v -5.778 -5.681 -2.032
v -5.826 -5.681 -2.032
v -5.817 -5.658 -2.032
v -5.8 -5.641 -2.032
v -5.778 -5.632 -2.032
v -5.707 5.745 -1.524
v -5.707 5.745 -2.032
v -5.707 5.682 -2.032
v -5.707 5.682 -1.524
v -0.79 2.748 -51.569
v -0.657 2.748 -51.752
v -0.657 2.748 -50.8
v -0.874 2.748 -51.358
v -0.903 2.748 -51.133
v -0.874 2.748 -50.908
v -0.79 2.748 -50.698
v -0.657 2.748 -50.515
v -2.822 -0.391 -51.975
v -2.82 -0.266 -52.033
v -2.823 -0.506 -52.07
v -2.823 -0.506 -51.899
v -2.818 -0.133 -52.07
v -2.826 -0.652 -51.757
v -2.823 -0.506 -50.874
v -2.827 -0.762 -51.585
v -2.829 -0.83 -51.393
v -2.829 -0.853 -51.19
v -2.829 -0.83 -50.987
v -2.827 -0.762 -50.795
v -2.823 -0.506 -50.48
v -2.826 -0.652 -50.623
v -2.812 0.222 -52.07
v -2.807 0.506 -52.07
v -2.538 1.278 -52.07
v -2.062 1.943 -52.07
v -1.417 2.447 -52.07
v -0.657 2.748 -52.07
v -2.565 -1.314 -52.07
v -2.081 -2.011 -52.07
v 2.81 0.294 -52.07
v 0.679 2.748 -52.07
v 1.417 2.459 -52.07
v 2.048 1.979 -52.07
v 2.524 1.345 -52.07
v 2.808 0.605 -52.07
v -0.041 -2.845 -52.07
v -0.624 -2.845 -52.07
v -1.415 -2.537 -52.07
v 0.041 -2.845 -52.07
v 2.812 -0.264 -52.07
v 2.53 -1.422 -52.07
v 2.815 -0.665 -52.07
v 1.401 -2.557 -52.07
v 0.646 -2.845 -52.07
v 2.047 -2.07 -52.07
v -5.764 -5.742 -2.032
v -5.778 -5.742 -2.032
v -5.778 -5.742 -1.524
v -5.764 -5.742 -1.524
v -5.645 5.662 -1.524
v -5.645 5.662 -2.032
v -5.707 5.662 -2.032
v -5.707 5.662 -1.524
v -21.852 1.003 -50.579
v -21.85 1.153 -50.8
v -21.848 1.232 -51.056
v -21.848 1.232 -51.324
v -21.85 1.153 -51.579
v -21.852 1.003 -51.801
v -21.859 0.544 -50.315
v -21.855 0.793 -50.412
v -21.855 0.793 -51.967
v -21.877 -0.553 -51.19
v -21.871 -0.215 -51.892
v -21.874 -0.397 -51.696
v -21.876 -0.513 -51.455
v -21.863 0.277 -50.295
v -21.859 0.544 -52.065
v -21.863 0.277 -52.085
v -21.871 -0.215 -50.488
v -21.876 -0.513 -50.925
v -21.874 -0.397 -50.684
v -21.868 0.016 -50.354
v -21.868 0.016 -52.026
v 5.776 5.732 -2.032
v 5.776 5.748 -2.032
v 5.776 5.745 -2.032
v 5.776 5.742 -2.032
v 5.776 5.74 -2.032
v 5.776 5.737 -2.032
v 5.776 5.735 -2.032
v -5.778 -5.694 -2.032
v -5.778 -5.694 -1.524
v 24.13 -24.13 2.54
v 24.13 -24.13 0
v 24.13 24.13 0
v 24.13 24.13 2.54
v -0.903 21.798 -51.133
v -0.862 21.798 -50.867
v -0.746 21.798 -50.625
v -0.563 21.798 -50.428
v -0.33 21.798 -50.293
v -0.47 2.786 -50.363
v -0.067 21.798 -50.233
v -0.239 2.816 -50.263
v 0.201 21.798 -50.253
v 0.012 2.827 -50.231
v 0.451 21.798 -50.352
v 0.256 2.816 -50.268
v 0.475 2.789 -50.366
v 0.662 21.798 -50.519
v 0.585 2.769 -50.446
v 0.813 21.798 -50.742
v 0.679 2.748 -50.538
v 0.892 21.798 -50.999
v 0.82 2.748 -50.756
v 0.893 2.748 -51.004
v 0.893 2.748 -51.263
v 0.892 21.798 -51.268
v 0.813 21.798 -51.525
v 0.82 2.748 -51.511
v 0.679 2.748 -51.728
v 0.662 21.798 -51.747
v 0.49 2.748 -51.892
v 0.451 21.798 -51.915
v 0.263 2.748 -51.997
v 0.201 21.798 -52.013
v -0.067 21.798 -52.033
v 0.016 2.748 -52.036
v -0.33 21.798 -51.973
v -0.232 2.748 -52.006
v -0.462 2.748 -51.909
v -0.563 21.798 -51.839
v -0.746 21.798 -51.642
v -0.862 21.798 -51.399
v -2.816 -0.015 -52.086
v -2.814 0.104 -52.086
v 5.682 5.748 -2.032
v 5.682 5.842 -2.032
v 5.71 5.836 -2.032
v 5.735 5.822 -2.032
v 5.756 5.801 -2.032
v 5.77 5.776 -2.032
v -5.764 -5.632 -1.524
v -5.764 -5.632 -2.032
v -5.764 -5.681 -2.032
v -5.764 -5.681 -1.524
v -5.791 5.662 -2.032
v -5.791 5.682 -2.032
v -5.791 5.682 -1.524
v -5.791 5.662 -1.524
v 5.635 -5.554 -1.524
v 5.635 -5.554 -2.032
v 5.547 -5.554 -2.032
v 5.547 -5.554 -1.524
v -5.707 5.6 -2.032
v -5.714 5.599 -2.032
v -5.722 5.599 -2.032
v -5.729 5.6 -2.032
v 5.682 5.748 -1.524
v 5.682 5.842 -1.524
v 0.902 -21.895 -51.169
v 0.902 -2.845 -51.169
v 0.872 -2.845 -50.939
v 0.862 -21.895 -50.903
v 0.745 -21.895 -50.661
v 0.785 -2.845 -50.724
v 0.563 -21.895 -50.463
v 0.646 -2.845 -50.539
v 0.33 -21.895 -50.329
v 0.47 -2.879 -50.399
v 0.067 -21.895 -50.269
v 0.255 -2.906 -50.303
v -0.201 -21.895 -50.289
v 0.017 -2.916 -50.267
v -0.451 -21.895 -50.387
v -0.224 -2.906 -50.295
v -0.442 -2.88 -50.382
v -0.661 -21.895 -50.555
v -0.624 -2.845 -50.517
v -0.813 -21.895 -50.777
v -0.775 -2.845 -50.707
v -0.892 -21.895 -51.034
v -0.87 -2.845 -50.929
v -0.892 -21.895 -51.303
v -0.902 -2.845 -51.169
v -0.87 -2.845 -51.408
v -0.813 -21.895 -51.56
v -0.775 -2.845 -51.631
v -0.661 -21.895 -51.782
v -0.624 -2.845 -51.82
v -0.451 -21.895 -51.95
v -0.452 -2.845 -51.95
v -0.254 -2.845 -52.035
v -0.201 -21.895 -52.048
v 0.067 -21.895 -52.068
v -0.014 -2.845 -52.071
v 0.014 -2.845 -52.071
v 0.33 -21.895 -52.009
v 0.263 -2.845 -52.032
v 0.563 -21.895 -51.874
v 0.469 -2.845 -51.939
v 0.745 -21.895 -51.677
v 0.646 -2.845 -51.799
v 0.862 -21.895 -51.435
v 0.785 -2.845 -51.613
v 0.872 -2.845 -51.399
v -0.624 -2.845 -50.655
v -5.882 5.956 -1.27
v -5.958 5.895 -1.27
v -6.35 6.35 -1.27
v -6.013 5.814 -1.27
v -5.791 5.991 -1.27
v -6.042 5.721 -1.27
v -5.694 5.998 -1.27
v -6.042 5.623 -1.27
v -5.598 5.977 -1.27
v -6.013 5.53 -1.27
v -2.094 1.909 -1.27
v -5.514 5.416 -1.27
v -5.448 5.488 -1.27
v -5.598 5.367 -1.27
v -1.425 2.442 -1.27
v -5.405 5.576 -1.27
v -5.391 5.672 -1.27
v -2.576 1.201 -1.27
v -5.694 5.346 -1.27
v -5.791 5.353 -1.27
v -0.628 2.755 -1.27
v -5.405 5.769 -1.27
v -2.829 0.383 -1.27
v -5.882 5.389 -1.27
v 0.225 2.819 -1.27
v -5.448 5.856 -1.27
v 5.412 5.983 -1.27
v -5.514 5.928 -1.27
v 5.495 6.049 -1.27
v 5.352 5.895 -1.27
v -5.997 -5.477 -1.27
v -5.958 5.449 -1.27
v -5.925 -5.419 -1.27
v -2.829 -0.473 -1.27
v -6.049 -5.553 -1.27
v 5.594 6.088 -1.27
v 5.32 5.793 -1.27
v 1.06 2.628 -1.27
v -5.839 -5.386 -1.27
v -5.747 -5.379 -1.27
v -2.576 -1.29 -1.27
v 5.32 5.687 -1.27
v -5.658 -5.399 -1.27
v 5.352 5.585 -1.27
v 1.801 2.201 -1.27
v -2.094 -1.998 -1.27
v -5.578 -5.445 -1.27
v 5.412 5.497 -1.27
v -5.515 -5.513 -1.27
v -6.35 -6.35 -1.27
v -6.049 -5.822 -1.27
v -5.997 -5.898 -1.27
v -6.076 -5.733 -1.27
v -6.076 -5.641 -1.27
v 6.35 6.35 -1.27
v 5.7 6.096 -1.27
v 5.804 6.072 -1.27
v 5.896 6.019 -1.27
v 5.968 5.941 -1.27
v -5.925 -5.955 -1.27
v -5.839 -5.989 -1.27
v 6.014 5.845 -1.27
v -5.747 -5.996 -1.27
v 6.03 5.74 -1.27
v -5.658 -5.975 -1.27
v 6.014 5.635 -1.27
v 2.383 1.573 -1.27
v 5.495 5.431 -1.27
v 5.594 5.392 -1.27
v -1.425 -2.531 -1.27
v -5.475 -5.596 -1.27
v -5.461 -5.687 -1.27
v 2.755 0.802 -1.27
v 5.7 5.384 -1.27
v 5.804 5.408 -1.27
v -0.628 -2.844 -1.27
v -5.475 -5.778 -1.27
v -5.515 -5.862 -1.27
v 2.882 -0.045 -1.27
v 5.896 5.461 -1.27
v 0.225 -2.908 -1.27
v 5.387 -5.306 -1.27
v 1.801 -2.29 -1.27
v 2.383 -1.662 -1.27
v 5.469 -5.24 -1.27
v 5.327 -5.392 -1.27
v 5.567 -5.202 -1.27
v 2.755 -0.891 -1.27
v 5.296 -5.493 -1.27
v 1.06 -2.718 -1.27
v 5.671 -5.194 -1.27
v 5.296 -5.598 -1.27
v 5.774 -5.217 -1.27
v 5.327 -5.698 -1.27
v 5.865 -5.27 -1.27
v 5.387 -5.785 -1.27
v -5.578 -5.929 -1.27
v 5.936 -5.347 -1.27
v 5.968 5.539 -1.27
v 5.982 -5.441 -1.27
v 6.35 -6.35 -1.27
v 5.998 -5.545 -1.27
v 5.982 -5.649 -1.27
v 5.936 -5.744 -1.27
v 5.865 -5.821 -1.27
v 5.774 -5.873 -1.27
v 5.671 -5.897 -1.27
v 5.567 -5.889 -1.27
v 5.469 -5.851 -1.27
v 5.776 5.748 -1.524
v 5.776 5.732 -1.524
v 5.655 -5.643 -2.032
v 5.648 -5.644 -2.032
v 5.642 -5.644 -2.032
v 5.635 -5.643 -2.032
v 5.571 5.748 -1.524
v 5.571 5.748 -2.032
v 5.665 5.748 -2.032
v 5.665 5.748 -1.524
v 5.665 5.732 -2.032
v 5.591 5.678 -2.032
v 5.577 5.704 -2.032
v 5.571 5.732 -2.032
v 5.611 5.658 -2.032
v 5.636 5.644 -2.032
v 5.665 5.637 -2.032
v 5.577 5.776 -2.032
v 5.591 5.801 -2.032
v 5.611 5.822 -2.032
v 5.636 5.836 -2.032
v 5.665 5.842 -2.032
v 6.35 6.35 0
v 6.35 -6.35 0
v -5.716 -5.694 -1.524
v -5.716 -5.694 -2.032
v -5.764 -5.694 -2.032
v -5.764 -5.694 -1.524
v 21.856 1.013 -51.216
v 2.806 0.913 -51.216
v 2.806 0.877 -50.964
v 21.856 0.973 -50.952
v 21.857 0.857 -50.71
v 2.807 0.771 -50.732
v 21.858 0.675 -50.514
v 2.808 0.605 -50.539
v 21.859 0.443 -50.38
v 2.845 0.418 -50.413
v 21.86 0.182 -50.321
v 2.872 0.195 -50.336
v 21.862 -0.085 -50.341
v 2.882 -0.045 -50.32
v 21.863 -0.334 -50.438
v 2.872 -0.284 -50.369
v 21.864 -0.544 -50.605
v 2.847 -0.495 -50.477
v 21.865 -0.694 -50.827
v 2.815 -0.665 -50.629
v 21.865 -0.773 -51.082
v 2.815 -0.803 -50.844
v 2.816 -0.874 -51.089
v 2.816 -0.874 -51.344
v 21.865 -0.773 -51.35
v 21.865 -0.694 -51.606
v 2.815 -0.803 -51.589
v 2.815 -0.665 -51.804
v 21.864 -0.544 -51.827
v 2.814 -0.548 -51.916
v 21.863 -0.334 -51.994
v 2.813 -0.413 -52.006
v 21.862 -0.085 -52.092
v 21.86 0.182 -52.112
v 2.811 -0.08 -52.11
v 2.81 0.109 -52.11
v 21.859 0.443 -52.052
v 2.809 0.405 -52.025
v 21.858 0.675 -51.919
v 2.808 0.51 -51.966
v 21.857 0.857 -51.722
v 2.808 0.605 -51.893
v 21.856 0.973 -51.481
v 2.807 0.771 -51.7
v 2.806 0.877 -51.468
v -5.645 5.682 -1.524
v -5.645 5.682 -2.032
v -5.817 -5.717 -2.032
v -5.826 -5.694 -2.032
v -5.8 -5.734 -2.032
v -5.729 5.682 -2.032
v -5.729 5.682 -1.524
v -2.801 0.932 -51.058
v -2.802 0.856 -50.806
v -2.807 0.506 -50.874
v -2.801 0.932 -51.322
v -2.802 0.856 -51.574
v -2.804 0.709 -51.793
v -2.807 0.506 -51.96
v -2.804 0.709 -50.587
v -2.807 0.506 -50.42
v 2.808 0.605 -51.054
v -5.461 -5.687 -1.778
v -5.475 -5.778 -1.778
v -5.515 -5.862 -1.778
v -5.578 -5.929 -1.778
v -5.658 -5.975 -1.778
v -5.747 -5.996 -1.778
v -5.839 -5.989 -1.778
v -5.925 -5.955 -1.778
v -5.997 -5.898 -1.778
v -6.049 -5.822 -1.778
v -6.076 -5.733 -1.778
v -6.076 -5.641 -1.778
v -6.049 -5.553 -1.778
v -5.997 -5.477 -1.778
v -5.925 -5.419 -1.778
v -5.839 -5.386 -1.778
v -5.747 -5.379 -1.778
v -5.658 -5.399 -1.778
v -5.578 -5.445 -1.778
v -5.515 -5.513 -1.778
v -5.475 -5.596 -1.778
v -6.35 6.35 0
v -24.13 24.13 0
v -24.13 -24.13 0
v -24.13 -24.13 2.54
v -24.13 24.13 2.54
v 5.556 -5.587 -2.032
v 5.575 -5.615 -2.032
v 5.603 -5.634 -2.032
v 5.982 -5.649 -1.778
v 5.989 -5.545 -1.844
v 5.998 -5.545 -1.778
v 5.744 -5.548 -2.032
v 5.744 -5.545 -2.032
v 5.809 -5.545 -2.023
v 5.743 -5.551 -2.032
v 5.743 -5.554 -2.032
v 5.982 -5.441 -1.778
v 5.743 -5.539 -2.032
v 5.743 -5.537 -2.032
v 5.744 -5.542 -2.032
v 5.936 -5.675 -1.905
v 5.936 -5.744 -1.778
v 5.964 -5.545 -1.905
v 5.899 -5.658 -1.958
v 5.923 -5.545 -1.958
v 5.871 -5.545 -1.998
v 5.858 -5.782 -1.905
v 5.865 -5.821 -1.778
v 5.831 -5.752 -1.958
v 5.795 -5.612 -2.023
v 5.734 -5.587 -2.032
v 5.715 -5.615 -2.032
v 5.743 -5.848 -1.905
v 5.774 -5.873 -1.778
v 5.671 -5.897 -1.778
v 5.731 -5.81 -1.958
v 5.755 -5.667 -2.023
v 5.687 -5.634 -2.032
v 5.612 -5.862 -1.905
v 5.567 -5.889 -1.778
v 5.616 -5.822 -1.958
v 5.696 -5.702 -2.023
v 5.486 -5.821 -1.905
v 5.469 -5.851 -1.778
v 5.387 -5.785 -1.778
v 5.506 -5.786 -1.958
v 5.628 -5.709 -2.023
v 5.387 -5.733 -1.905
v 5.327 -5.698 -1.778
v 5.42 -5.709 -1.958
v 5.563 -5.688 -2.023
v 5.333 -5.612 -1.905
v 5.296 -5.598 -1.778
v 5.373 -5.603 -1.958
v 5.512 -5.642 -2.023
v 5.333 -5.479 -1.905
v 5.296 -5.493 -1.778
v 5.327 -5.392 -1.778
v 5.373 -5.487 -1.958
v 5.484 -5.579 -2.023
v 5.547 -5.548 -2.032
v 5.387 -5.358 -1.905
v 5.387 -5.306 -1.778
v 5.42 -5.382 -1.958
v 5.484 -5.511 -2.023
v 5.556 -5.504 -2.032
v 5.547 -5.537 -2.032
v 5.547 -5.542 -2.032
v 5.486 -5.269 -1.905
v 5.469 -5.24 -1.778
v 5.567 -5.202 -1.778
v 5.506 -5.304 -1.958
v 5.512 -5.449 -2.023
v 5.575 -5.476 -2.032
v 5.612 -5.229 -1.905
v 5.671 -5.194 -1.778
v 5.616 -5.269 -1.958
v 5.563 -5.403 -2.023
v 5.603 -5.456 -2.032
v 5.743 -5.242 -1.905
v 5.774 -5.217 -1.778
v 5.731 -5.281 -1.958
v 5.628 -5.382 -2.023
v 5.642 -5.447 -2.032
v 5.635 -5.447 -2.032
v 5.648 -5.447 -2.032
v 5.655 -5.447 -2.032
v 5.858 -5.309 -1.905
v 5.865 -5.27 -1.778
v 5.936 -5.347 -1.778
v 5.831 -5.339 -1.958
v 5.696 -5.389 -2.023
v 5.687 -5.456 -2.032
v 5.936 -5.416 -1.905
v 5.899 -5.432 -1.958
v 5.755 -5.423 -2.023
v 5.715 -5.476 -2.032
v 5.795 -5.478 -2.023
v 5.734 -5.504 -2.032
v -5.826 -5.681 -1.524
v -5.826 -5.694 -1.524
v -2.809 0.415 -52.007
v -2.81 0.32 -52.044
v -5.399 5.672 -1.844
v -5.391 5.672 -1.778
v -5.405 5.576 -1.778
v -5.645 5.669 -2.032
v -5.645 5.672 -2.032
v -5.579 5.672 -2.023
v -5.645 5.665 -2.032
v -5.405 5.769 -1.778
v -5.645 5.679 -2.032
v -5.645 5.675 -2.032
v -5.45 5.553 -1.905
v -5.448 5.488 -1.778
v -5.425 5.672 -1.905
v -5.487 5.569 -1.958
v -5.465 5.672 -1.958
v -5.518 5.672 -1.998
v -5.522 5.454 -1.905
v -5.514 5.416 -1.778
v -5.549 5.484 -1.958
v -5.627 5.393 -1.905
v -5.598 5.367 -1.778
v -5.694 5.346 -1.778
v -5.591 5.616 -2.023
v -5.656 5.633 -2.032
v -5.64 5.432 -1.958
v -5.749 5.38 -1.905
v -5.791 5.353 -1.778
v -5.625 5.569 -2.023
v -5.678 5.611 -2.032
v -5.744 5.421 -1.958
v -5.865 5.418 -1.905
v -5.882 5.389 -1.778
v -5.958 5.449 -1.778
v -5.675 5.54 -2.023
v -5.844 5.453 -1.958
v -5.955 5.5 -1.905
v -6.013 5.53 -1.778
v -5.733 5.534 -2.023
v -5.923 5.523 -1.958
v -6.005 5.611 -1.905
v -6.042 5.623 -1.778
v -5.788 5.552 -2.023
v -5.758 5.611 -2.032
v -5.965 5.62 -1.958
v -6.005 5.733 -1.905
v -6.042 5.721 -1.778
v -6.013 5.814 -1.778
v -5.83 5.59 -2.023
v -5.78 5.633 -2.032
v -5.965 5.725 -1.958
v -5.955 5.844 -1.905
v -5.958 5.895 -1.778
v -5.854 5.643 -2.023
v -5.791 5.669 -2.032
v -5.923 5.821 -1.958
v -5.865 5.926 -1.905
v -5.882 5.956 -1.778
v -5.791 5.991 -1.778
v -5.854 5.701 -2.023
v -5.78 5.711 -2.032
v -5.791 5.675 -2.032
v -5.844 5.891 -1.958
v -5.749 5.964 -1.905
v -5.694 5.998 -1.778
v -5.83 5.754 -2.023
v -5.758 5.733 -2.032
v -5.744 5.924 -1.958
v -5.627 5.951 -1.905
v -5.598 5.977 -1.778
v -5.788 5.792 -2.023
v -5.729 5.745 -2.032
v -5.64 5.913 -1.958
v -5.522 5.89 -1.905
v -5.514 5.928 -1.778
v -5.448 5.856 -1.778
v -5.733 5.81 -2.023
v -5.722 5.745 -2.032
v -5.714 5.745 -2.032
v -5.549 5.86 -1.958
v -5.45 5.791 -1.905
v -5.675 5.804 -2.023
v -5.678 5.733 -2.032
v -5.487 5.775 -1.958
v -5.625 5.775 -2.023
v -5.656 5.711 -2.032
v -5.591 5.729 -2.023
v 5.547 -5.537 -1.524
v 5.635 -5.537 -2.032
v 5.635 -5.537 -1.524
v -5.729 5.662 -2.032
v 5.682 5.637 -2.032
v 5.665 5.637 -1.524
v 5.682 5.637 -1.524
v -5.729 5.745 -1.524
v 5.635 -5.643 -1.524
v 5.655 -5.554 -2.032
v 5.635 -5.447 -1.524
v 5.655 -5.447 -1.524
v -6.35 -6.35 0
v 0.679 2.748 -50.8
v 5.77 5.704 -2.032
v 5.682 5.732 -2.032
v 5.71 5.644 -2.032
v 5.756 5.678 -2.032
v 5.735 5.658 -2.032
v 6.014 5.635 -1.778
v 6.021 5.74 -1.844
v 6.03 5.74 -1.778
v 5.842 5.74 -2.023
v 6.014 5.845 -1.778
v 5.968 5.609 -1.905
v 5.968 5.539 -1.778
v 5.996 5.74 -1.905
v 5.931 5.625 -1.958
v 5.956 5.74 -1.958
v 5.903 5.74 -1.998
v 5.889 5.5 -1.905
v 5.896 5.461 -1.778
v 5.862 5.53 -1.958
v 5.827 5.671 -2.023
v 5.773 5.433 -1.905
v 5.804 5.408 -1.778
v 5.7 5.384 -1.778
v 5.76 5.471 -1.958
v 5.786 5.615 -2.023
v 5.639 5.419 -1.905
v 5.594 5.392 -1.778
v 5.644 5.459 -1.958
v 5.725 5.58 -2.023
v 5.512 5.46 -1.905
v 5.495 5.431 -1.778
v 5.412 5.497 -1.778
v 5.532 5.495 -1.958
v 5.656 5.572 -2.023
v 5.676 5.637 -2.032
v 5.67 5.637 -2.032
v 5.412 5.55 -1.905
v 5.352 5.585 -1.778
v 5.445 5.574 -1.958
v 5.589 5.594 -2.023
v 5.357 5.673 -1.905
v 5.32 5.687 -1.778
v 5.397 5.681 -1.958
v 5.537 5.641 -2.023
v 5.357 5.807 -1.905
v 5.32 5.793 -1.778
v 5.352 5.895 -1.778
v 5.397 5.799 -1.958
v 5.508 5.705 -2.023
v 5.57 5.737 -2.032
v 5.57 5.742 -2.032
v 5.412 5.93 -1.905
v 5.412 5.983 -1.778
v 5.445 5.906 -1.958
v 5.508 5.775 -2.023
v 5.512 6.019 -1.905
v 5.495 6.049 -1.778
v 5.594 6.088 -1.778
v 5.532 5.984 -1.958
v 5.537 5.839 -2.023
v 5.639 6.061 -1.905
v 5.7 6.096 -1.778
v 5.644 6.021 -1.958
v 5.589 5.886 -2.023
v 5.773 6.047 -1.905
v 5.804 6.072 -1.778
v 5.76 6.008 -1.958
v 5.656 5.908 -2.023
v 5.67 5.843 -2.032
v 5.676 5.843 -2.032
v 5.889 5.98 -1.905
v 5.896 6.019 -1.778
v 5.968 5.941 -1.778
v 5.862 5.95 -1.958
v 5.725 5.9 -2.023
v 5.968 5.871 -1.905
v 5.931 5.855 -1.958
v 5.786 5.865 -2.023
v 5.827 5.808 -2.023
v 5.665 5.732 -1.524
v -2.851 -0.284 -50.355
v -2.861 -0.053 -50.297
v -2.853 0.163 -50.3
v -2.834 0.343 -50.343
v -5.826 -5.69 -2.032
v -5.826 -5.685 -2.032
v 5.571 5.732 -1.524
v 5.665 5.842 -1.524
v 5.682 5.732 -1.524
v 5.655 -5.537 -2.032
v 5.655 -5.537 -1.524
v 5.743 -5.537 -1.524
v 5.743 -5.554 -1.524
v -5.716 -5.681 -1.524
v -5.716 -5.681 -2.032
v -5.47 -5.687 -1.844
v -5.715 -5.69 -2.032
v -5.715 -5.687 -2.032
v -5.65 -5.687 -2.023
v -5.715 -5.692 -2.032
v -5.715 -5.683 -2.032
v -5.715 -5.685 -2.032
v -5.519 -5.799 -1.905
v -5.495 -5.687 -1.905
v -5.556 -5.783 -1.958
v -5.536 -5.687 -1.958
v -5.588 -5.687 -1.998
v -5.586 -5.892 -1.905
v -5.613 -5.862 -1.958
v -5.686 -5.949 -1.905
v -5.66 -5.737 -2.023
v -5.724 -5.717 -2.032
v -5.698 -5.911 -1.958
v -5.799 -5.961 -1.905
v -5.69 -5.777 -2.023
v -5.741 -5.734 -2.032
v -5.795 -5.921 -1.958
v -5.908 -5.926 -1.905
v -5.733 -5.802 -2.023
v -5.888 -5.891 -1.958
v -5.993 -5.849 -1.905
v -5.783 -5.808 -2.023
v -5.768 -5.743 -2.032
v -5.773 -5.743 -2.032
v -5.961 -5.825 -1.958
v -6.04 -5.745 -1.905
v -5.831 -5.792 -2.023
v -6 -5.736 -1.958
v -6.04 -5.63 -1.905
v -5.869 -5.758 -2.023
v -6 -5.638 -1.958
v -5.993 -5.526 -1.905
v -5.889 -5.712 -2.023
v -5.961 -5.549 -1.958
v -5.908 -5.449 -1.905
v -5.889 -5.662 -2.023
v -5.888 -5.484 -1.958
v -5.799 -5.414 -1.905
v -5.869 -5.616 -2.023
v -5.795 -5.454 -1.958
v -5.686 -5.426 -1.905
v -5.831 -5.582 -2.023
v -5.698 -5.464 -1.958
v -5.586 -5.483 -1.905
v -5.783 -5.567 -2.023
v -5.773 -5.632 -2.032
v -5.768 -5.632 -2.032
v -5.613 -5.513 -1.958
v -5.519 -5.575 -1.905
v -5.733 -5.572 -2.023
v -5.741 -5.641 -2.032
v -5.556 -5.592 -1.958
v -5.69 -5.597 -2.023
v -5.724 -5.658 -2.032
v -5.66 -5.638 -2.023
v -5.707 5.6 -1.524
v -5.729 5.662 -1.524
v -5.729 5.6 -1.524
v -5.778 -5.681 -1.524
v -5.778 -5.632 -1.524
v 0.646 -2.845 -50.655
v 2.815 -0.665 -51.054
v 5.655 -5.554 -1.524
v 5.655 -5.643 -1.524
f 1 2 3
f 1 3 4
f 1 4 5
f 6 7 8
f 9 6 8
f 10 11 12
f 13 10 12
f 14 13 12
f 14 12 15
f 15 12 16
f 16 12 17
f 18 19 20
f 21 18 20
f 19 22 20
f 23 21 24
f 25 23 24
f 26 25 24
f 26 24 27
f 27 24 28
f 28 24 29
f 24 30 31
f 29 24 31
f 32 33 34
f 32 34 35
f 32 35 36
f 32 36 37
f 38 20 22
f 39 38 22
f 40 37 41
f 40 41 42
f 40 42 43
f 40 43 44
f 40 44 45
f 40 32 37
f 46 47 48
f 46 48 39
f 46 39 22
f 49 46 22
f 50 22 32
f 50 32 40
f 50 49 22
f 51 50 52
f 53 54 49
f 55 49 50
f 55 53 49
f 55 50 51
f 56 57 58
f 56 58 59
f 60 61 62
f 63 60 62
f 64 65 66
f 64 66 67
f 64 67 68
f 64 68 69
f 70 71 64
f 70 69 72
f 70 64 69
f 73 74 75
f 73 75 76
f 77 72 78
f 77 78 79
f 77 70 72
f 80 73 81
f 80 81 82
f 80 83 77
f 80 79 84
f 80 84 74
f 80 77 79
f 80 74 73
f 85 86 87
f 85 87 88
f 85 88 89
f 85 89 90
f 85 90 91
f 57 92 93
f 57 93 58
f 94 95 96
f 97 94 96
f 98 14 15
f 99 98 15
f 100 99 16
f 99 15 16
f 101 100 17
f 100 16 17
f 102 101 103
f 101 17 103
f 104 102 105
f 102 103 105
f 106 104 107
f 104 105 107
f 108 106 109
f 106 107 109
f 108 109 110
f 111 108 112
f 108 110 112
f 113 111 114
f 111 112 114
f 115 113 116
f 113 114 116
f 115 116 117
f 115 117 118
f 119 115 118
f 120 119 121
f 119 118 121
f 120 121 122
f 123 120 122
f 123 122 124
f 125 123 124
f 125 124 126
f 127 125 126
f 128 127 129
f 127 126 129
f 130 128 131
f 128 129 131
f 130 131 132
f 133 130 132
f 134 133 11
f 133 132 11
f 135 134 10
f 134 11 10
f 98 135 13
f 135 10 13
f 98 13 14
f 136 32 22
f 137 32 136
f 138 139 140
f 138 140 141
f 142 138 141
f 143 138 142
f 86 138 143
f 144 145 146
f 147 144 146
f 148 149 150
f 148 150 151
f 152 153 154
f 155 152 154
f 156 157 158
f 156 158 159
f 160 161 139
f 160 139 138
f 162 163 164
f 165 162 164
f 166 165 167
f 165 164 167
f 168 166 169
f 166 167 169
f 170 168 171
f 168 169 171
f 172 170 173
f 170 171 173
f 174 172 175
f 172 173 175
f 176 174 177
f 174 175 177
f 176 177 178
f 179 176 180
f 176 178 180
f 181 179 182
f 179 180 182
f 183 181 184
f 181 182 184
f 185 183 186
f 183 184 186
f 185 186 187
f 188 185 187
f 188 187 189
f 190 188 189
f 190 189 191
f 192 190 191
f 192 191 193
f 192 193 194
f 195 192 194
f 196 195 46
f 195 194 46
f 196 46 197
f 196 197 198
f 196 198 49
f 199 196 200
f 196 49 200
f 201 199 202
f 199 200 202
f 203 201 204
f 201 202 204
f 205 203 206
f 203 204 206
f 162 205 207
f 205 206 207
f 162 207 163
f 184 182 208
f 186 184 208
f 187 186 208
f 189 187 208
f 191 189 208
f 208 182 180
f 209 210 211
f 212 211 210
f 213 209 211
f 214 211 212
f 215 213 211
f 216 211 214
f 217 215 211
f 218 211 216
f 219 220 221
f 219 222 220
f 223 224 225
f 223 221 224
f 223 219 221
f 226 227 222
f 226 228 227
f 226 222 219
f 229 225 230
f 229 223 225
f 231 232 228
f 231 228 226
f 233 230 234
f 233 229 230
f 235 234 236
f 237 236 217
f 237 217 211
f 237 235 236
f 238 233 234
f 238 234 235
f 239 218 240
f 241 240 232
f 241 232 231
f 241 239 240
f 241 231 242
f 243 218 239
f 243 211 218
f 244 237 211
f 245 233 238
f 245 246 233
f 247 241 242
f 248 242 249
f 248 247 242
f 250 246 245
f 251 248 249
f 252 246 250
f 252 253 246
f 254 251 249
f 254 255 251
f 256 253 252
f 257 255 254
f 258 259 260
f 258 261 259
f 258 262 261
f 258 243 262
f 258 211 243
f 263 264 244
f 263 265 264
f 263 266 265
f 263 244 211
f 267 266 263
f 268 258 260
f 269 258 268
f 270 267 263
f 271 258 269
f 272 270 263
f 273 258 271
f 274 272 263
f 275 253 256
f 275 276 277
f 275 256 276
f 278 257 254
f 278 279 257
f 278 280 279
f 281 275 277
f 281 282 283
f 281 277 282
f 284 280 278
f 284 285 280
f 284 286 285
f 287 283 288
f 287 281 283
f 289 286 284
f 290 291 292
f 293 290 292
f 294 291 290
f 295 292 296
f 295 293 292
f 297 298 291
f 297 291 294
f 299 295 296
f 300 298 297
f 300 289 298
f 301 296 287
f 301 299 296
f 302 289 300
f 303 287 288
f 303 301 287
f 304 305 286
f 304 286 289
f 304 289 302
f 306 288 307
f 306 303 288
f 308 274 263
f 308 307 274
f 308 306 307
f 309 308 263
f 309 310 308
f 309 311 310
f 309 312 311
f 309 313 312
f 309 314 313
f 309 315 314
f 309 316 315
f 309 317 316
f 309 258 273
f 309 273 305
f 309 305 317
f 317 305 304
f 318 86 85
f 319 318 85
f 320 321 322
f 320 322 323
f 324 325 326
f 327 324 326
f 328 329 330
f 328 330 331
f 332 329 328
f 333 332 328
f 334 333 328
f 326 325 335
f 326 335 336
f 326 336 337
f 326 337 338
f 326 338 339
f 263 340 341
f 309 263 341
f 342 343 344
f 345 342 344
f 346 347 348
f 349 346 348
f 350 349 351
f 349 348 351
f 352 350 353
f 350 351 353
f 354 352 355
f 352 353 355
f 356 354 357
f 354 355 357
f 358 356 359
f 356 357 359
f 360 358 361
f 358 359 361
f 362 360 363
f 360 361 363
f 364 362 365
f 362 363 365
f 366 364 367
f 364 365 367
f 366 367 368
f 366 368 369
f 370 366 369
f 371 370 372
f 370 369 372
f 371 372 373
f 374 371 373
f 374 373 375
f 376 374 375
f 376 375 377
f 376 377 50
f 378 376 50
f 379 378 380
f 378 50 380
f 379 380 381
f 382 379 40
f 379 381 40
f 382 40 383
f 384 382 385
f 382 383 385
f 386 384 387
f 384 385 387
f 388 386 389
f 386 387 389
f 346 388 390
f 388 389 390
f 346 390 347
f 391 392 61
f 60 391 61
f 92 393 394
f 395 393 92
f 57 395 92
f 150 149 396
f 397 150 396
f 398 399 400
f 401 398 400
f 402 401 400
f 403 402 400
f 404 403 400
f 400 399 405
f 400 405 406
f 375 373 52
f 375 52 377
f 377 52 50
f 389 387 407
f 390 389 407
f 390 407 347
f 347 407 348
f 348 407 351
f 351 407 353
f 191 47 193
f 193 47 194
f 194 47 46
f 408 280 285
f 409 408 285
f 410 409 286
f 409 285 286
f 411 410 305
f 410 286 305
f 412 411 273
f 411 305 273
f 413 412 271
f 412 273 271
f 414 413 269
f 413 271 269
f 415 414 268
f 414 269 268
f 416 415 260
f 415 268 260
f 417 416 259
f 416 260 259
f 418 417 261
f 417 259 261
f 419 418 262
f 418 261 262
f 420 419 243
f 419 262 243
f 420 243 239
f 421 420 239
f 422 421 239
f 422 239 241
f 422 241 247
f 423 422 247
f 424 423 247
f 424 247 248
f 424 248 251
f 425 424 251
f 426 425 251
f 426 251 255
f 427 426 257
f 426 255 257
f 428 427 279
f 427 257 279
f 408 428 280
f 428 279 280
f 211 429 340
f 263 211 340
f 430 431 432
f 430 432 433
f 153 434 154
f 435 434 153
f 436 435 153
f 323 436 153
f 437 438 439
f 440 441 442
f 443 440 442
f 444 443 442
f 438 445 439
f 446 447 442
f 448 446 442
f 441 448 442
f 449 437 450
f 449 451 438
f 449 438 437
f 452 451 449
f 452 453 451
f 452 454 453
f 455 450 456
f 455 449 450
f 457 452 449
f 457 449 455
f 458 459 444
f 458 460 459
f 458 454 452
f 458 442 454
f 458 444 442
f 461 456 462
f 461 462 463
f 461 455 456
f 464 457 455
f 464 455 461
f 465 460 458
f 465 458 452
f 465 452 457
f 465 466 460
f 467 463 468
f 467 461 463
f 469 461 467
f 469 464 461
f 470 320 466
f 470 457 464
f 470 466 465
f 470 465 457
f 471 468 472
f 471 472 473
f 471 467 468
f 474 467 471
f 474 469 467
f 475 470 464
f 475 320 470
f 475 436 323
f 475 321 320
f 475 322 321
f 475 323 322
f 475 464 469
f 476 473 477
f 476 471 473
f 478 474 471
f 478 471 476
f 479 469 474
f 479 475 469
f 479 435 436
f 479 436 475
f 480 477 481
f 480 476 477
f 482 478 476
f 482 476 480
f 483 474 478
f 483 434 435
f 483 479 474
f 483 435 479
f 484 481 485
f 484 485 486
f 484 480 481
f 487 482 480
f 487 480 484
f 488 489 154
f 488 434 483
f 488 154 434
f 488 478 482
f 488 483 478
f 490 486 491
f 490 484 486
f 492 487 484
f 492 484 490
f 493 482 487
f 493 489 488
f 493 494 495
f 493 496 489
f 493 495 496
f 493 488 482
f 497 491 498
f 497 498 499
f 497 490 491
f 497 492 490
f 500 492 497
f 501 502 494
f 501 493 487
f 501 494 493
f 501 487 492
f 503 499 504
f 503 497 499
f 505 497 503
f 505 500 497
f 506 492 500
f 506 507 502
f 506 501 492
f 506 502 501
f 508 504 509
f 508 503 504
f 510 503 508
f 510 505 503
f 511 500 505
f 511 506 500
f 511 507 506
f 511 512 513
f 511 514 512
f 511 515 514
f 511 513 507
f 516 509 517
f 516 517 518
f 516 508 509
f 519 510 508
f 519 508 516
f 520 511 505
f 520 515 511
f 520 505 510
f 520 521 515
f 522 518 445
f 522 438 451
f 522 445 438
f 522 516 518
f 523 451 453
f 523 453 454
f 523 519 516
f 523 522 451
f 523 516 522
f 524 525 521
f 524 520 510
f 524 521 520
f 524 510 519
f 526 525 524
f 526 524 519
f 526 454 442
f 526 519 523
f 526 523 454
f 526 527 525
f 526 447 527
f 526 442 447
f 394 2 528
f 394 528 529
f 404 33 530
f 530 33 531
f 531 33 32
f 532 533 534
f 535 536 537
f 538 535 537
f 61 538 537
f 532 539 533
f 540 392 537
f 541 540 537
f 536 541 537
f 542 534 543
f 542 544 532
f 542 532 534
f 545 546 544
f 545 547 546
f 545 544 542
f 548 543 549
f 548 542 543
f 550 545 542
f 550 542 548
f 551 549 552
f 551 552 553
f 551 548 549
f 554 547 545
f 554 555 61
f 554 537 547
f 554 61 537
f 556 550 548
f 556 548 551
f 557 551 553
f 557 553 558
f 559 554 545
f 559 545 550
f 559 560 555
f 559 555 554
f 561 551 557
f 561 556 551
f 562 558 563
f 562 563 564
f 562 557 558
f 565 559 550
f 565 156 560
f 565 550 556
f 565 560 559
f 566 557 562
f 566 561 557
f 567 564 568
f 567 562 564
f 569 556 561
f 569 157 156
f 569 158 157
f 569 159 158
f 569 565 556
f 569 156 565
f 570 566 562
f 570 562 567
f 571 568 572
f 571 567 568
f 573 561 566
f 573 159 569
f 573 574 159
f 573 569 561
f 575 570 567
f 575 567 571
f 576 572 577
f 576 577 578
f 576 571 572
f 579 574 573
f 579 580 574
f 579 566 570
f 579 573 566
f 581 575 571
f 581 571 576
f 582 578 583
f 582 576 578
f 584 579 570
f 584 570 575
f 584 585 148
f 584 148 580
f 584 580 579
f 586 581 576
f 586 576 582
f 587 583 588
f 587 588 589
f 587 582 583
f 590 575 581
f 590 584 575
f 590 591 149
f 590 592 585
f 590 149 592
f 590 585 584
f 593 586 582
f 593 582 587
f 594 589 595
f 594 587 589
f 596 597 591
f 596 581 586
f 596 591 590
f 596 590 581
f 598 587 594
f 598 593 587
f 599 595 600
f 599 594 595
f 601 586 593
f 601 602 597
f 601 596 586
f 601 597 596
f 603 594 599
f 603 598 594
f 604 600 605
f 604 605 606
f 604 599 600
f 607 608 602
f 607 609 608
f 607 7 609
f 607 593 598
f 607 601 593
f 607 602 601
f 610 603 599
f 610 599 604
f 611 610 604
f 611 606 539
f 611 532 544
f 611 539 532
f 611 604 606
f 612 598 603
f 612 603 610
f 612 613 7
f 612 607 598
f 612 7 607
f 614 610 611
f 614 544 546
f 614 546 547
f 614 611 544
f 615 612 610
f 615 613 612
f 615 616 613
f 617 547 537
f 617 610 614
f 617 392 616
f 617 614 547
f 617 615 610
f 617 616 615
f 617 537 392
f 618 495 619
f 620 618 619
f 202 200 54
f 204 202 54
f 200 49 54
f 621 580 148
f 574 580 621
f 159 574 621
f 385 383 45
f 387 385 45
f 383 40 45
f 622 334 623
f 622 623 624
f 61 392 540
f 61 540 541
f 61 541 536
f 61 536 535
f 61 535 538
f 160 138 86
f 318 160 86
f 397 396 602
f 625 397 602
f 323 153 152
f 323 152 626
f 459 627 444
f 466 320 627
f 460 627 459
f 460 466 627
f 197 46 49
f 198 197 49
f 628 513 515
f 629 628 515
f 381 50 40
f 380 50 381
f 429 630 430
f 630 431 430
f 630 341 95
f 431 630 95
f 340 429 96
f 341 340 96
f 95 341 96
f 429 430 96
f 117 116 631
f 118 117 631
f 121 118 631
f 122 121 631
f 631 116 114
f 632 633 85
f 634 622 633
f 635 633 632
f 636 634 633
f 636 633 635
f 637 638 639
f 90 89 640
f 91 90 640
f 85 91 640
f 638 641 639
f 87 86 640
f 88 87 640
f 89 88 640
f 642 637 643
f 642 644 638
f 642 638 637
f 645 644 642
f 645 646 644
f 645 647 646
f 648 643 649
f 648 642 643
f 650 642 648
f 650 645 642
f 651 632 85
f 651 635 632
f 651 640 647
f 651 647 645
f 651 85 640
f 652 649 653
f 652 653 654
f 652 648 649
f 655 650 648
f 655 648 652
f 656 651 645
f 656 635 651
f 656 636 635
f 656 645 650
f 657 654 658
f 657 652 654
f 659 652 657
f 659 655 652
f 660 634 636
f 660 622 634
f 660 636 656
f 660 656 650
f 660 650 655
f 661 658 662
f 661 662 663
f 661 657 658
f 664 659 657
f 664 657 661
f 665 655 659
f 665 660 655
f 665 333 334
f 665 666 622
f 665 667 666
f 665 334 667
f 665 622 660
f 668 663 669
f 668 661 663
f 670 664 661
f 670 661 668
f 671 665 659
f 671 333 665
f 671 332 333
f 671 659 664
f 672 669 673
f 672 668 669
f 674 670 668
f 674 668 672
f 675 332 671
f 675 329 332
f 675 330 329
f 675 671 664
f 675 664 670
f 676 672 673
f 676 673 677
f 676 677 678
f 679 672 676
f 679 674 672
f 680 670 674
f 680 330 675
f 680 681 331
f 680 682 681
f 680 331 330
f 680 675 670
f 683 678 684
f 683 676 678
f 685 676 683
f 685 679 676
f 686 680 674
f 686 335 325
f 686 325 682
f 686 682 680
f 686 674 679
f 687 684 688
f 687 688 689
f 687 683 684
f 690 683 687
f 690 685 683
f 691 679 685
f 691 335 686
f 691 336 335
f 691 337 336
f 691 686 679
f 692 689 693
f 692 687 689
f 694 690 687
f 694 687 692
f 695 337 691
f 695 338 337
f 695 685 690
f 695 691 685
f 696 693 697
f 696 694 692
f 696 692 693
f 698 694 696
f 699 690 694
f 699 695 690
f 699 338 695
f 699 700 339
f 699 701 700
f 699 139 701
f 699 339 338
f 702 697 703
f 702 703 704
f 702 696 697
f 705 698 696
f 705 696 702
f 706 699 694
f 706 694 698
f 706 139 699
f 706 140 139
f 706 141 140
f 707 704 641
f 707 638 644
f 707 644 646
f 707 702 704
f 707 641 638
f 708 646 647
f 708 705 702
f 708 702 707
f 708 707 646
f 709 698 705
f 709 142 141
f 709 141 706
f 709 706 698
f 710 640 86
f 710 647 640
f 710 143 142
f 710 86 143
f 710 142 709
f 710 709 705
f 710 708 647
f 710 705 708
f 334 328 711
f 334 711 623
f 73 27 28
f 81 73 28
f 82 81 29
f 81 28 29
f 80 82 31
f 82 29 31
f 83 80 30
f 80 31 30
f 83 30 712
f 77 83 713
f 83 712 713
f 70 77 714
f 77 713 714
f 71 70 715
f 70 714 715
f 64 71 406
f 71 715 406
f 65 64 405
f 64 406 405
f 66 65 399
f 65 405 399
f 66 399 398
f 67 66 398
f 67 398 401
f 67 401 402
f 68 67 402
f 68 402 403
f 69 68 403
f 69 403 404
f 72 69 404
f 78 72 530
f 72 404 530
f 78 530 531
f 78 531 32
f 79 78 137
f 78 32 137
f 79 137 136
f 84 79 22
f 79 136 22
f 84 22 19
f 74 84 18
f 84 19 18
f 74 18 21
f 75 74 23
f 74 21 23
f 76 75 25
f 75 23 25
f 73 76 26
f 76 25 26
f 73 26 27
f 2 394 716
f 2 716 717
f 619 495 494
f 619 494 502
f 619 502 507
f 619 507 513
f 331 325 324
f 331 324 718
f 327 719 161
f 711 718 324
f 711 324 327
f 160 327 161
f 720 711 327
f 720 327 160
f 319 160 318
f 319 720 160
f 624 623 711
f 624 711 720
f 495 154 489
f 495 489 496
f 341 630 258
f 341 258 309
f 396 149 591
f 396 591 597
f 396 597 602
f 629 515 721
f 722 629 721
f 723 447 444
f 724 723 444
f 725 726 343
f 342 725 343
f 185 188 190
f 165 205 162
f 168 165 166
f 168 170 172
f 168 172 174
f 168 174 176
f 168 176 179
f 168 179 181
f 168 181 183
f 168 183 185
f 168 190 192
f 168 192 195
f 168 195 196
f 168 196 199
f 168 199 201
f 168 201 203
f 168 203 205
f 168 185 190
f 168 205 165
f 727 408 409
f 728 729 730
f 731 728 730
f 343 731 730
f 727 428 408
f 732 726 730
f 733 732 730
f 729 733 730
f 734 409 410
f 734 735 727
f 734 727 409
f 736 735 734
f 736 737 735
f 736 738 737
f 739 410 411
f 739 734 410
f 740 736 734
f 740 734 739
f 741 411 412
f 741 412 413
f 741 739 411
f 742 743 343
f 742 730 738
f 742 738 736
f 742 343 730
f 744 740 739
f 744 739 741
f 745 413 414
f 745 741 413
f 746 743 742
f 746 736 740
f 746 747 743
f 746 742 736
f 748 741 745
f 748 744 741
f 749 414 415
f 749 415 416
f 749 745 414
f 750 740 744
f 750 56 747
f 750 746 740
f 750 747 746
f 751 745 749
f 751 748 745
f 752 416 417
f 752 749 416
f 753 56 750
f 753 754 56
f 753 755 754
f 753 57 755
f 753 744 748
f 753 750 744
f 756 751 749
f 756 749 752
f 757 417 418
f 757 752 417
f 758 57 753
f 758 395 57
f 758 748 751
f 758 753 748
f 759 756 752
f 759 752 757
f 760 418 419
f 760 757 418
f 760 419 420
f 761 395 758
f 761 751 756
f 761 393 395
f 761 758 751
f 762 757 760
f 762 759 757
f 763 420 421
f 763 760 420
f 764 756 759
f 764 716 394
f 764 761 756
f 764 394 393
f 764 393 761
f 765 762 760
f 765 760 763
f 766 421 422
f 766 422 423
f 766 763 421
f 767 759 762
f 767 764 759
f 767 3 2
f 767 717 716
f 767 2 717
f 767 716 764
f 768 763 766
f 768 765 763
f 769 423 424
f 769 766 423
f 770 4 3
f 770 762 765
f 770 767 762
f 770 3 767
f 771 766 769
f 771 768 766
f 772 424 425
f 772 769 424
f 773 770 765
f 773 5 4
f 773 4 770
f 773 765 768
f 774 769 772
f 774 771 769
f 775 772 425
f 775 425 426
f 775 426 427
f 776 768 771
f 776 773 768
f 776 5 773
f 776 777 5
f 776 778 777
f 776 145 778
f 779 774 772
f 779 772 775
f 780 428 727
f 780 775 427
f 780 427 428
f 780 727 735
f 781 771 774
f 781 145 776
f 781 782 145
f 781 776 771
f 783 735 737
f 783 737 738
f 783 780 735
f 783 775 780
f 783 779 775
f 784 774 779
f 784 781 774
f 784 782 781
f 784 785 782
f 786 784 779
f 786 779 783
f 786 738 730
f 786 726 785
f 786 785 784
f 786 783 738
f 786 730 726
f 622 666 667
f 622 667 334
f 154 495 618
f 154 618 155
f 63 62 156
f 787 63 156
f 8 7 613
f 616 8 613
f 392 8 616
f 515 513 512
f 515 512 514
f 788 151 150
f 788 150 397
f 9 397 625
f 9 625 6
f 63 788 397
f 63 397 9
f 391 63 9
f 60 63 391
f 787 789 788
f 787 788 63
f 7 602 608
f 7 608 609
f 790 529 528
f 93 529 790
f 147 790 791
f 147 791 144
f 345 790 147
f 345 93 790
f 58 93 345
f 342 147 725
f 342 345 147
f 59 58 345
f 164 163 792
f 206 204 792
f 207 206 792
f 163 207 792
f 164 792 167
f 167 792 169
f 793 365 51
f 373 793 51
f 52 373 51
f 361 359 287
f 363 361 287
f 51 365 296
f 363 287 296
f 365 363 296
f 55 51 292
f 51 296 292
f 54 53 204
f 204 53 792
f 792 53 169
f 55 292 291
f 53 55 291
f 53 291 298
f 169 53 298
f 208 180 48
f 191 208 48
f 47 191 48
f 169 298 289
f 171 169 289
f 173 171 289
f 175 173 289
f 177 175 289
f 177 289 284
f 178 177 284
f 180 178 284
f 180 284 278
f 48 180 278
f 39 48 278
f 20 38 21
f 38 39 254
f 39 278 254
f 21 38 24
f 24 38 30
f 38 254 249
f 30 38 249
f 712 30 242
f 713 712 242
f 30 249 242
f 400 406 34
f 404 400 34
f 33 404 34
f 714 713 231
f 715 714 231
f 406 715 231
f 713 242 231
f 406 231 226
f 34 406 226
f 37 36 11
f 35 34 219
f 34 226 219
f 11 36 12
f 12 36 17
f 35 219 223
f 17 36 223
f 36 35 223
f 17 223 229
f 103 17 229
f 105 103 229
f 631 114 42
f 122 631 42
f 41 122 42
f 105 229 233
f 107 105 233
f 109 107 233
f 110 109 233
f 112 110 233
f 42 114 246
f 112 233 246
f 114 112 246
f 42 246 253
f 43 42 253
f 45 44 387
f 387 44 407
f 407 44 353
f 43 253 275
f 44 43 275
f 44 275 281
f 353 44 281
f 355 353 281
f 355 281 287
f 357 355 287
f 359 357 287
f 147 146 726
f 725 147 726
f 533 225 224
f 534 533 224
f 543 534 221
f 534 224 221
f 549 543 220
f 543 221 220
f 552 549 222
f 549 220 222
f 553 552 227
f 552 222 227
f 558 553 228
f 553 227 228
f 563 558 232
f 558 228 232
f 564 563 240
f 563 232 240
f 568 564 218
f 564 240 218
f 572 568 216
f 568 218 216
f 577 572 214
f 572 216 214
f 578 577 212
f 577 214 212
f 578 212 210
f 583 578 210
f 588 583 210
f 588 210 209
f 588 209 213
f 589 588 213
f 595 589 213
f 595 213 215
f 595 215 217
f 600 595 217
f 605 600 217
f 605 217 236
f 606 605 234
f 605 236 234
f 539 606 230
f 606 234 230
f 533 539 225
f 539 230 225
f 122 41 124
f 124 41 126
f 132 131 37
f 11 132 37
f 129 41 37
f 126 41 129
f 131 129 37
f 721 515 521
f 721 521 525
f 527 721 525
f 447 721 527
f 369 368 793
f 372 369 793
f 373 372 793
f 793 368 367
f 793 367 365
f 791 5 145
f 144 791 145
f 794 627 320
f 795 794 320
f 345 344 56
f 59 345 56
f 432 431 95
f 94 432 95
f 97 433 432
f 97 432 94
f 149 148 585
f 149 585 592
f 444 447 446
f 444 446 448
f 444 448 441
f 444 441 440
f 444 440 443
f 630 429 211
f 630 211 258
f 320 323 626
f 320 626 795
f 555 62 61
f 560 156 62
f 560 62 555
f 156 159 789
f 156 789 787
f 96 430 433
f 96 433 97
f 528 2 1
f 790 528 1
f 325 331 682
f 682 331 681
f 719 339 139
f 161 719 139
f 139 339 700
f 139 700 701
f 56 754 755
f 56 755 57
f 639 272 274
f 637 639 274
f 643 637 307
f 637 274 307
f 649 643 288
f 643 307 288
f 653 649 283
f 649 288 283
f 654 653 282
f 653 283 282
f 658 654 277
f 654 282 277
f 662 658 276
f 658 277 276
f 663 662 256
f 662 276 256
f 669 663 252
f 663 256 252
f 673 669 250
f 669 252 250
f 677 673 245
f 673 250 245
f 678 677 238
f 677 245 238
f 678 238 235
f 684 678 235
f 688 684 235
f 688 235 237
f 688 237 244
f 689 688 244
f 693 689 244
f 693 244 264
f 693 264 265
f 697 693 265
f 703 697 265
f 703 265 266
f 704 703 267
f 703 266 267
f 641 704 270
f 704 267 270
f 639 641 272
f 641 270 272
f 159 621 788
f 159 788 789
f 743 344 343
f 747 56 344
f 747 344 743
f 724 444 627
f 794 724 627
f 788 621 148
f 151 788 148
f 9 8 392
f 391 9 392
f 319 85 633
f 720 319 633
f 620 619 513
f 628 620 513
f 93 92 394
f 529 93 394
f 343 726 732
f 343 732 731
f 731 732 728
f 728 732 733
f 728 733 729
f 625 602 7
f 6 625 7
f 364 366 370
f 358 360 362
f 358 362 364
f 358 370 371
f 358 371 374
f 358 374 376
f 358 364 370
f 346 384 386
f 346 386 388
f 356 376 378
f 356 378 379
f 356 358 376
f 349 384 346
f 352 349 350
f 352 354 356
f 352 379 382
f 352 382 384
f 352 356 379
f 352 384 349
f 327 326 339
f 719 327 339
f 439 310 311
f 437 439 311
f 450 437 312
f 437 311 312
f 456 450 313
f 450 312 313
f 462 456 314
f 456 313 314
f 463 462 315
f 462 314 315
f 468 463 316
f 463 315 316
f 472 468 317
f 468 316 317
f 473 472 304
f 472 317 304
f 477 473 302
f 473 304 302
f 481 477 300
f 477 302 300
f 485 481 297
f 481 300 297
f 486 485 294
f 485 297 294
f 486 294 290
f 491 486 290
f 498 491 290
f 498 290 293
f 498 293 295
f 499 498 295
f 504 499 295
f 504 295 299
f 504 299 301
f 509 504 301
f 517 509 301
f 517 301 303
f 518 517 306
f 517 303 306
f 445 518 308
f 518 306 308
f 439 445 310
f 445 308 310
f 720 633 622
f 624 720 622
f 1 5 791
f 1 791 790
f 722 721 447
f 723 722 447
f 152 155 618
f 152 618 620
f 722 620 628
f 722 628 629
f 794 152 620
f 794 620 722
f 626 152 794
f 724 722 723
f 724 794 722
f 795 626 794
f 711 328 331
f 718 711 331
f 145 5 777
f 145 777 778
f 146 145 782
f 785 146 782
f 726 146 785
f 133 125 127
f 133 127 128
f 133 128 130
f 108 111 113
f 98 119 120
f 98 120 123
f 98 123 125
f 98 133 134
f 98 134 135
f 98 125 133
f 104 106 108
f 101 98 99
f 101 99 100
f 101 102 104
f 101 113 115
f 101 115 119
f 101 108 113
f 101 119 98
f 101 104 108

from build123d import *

# Parameters (mm, degrees)
F0_W      = 48.26
F0_H      = 48.26
F1_DEPTH  = 2.54
F2_W      = 12.7
F2_H      = 12.7
F3_DEPTH  = 1.27
F4_R      = 2.8715074031
F5_DEPTH  = 50.8
F6_R      = 0.3093193385
F6_R_2    = 0.3272888375
F6_R_3    = 0.3568571673
F6_R_4    = 0.3525339216
F7_DEPTH  = 0.762
F8_R      = 0.254
F12_W     = 0.0615678008
F12_H     = 0.0203329791
F12_W_2   = 0.0220249466
F12_H_2   = 0.0622902502
F11_W     = 0.0480206565
F11_H     = 0.0132349783
F11_W_2   = 0.0138029049
F11_H_2   = 0.0482696602
F10_W     = 0.0884033393
F10_H     = 0.017505979
F10_W_2   = 0.0194820769
F10_H_2   = 0.0892982516
F9_W      = 0.0940955169
F9_H      = 0.0154326007
F9_W_2    = 0.0169436104
F9_H_2    = 0.0947913842
F13_DEPTH = 0.508
F15_DEPTH = 1.41478
F16_R     = 0.9021855569
F17_DEPTH = 19.05
F19_DEPTH = 1.016
F20_R     = 0.8982139902
F21_DEPTH = 19.05
F23_DEPTH = 1.27
F24_R     = 0.9025250594
F25_DEPTH = 19.05
F27_DEPTH = 1.19634
F28_R     = 0.8978475469
F29_DEPTH = 19.05


with BuildPart() as f1:
    # F0 (on Top) → F1 (new body)
    with BuildSketch(Plane.XY):
        Rectangle(F0_W, F0_H)
    extrude(amount=F1_DEPTH)

    # F2 (on face) → F3 (join)
    with BuildSketch(Plane(origin=(0, 0, 0), x_dir=(1, 0, 0), z_dir=(0, 0, -1))):
        Rectangle(F2_W, F2_H)
    extrude(amount=F3_DEPTH)

    # F4 (on face) → F5 (join)
    with BuildSketch(Plane(origin=(0, 0, -1.27), x_dir=(1, 0, 0), z_dir=(0, 0, -1))):
        with Locations((0.0108288368, 0.0445277688)):
            Circle(F4_R)
    extrude(amount=F5_DEPTH)

    # F6 (on face) → F7 (join)
    with BuildSketch(Plane(origin=(0, 0, -1.27), x_dir=(1, 0, 0), z_dir=(0, 0, -1))):
        with Locations((-5.7706111111, 5.6873215362)):
            Circle(F6_R)
        with Locations((-5.7180044241, -5.6720911525)):
            Circle(F6_R_2)
        with Locations((5.6732143275, -5.739856977)):
            Circle(F6_R_3)
        with Locations((5.6450250559, 5.5452911183)):
            Circle(F6_R_4)
    extrude(amount=F7_DEPTH)

    # F8
    f8_edges = [f1.edges().sort_by_distance(p)[0] for p in [
        (-6.07993, -5.687322, -2.032),
        (5.316357, 5.739857, -2.032),
        (-6.045293, 5.672091, -2.032),
        (5.292491, -5.545291, -2.032),
    ]]
    fillet(f8_edges, radius=F8_R)

    # F12 (on face) + F11 (on face) + F10 (on face) + F9 (on face) → F13 (cut)
    with BuildSketch(Plane(origin=(0, 0, -2.032), x_dir=(1, 0, 0), z_dir=(0, 0, -1))):
        with Locations((-5.6762080504, -5.6720911525)):
            Rectangle(F12_W, F12_H)
        with Locations((-5.7180044241, -5.7134027672)):
            Rectangle(F12_W_2, F12_H_2)
        with Locations((-5.7180044241, -5.6720911525)):
            Rectangle(F12_W_2, F12_H)
        with Locations((-5.7598007978, -5.6720911525)):
            Rectangle(F12_W, F12_H)
        with Locations((-5.7180044241, -5.6307795379)):
            Rectangle(F12_W_2, F12_H_2)
    with BuildSketch(Plane(origin=(0, 0, -2.032), x_dir=(1, 0, 0), z_dir=(0, 0, -1))):
        with Locations((-5.8015228918, 5.6873215362)):
            Rectangle(F11_W, F11_H)
        with Locations((-5.7396993304, 5.6873215362)):
            Rectangle(F11_W, F11_H)
        with Locations((-5.7706111111, 5.6873215362)):
            Rectangle(F11_W_2, F11_H)
        with Locations((-5.7706111111, 5.656569217)):
            Rectangle(F11_W_2, F11_H_2)
        with Locations((-5.7706111111, 5.7180738555)):
            Rectangle(F11_W_2, F11_H_2)
    with BuildSketch(Plane(origin=(0, 0, -2.032), x_dir=(1, 0, 0), z_dir=(0, 0, -1))):
        with Locations((5.6989677639, 5.5452911183)):
            Rectangle(F10_W, F10_H)
        with Locations((5.6450250559, 5.491889003)):
            Rectangle(F10_W_2, F10_H_2)
        with Locations((5.6450250559, 5.5452911183)):
            Rectangle(F10_W_2, F10_H)
        with Locations((5.5910823478, 5.5452911183)):
            Rectangle(F10_W, F10_H)
        with Locations((5.6450250559, 5.5986932336)):
            Rectangle(F10_W_2, F10_H_2)
    with BuildSketch(Plane(origin=(0, 0, -2.032), x_dir=(1, 0, 0), z_dir=(0, 0, -1))):
        with Locations((5.7287338912, -5.739856977)):
            Rectangle(F9_W, F9_H)
        with Locations((5.6732143275, -5.7949689694)):
            Rectangle(F9_W_2, F9_H_2)
        with Locations((5.6732143275, -5.739856977)):
            Rectangle(F9_W_2, F9_H)
        with Locations((5.6176947639, -5.739856977)):
            Rectangle(F9_W, F9_H)
        with Locations((5.6732143275, -5.6847449846)):
            Rectangle(F9_W_2, F9_H_2)
    extrude(amount=-F13_DEPTH, mode=Mode.SUBTRACT)

    # F14 (on face) → F15 (cut)
    with BuildSketch(Plane(origin=(0, 0, -52.07), x_dir=(1, 0, 0), z_dir=(0, 0, -1))):
        Polygon((0, 3.2037144993), (-0.6241711632, 2.8449437675), (0.6458288368, 2.8449437675), align=None)
    extrude(amount=-F15_DEPTH, mode=Mode.SUBTRACT)

    # F16 (on face) → F17 (join)
    with BuildSketch(Plane.XZ.offset(2.8449437675)):
        with Locations((0, -51.1687509716)):
            Circle(F16_R)
    extrude(amount=F17_DEPTH)

    # F18 (on face) → F19 (cut)
    with BuildSketch(Plane(origin=(0, 0, -52.07), x_dir=(1, 0, 0), z_dir=(0, 0, -1))):
        Polygon((3.0578877777, 0), (2.8145416692, 0.6648092527), (2.8078707354, -0.6051732269), align=None)
    extrude(amount=-F19_DEPTH, mode=Mode.SUBTRACT)

    # F20 (on face) → F21 (join)
    with BuildSketch(Plane(origin=(2.8109720156, 0.0147654072, 0), x_dir=(-0.0052527038, 0.9999862045, 0), z_dir=(0.9999862045, 0.0052527038, 0))):
        with Locations((0, -51.2162931263)):
            Circle(F20_R)
    extrude(amount=F21_DEPTH)

    # F22 (on face) → F23 (cut)
    with BuildSketch(Plane(origin=(0, 0, -52.07), x_dir=(1, 0, 0), z_dir=(0, 0, -1))):
        Polygon((0.6786663537, -2.7482392851), (-0.6570086801, -2.7482392851), (0, -2.9700854793), align=None)
    extrude(amount=-F23_DEPTH, mode=Mode.SUBTRACT)

    # F24 (on face) → F25 (join)
    with BuildSketch(Plane(origin=(0, 2.7482392851, 0), x_dir=(-1, 0, 0), z_dir=(0, 1, 0))):
        with Locations((0, -51.1333122849)):
            Circle(F24_R)
    extrude(amount=F25_DEPTH)

    # F26 (on face) → F27 (cut)
    with BuildSketch(Plane(origin=(0, 0, -52.07), x_dir=(1, 0, 0), z_dir=(0, 0, -1))):
        Polygon((-2.8074634724, -0.5057296489), (-2.8154312504, 0), (-2.8233990284, 0.5057296489), (-2.9956893995, 0), align=None)
    extrude(amount=-F27_DEPTH, mode=Mode.SUBTRACT)

    # F28 (on face) → F29 (join)
    with BuildSketch(Plane(origin=(-2.8147325761, 0.0443461527, 0), x_dir=(-0.0157530595, -0.9998759129, 0), z_dir=(-0.9998759129, 0.0157530595, 0))):
        with Locations((0, -51.189865917)):
            Circle(F28_R)
    extrude(amount=F29_DEPTH)


solid = f1.part
